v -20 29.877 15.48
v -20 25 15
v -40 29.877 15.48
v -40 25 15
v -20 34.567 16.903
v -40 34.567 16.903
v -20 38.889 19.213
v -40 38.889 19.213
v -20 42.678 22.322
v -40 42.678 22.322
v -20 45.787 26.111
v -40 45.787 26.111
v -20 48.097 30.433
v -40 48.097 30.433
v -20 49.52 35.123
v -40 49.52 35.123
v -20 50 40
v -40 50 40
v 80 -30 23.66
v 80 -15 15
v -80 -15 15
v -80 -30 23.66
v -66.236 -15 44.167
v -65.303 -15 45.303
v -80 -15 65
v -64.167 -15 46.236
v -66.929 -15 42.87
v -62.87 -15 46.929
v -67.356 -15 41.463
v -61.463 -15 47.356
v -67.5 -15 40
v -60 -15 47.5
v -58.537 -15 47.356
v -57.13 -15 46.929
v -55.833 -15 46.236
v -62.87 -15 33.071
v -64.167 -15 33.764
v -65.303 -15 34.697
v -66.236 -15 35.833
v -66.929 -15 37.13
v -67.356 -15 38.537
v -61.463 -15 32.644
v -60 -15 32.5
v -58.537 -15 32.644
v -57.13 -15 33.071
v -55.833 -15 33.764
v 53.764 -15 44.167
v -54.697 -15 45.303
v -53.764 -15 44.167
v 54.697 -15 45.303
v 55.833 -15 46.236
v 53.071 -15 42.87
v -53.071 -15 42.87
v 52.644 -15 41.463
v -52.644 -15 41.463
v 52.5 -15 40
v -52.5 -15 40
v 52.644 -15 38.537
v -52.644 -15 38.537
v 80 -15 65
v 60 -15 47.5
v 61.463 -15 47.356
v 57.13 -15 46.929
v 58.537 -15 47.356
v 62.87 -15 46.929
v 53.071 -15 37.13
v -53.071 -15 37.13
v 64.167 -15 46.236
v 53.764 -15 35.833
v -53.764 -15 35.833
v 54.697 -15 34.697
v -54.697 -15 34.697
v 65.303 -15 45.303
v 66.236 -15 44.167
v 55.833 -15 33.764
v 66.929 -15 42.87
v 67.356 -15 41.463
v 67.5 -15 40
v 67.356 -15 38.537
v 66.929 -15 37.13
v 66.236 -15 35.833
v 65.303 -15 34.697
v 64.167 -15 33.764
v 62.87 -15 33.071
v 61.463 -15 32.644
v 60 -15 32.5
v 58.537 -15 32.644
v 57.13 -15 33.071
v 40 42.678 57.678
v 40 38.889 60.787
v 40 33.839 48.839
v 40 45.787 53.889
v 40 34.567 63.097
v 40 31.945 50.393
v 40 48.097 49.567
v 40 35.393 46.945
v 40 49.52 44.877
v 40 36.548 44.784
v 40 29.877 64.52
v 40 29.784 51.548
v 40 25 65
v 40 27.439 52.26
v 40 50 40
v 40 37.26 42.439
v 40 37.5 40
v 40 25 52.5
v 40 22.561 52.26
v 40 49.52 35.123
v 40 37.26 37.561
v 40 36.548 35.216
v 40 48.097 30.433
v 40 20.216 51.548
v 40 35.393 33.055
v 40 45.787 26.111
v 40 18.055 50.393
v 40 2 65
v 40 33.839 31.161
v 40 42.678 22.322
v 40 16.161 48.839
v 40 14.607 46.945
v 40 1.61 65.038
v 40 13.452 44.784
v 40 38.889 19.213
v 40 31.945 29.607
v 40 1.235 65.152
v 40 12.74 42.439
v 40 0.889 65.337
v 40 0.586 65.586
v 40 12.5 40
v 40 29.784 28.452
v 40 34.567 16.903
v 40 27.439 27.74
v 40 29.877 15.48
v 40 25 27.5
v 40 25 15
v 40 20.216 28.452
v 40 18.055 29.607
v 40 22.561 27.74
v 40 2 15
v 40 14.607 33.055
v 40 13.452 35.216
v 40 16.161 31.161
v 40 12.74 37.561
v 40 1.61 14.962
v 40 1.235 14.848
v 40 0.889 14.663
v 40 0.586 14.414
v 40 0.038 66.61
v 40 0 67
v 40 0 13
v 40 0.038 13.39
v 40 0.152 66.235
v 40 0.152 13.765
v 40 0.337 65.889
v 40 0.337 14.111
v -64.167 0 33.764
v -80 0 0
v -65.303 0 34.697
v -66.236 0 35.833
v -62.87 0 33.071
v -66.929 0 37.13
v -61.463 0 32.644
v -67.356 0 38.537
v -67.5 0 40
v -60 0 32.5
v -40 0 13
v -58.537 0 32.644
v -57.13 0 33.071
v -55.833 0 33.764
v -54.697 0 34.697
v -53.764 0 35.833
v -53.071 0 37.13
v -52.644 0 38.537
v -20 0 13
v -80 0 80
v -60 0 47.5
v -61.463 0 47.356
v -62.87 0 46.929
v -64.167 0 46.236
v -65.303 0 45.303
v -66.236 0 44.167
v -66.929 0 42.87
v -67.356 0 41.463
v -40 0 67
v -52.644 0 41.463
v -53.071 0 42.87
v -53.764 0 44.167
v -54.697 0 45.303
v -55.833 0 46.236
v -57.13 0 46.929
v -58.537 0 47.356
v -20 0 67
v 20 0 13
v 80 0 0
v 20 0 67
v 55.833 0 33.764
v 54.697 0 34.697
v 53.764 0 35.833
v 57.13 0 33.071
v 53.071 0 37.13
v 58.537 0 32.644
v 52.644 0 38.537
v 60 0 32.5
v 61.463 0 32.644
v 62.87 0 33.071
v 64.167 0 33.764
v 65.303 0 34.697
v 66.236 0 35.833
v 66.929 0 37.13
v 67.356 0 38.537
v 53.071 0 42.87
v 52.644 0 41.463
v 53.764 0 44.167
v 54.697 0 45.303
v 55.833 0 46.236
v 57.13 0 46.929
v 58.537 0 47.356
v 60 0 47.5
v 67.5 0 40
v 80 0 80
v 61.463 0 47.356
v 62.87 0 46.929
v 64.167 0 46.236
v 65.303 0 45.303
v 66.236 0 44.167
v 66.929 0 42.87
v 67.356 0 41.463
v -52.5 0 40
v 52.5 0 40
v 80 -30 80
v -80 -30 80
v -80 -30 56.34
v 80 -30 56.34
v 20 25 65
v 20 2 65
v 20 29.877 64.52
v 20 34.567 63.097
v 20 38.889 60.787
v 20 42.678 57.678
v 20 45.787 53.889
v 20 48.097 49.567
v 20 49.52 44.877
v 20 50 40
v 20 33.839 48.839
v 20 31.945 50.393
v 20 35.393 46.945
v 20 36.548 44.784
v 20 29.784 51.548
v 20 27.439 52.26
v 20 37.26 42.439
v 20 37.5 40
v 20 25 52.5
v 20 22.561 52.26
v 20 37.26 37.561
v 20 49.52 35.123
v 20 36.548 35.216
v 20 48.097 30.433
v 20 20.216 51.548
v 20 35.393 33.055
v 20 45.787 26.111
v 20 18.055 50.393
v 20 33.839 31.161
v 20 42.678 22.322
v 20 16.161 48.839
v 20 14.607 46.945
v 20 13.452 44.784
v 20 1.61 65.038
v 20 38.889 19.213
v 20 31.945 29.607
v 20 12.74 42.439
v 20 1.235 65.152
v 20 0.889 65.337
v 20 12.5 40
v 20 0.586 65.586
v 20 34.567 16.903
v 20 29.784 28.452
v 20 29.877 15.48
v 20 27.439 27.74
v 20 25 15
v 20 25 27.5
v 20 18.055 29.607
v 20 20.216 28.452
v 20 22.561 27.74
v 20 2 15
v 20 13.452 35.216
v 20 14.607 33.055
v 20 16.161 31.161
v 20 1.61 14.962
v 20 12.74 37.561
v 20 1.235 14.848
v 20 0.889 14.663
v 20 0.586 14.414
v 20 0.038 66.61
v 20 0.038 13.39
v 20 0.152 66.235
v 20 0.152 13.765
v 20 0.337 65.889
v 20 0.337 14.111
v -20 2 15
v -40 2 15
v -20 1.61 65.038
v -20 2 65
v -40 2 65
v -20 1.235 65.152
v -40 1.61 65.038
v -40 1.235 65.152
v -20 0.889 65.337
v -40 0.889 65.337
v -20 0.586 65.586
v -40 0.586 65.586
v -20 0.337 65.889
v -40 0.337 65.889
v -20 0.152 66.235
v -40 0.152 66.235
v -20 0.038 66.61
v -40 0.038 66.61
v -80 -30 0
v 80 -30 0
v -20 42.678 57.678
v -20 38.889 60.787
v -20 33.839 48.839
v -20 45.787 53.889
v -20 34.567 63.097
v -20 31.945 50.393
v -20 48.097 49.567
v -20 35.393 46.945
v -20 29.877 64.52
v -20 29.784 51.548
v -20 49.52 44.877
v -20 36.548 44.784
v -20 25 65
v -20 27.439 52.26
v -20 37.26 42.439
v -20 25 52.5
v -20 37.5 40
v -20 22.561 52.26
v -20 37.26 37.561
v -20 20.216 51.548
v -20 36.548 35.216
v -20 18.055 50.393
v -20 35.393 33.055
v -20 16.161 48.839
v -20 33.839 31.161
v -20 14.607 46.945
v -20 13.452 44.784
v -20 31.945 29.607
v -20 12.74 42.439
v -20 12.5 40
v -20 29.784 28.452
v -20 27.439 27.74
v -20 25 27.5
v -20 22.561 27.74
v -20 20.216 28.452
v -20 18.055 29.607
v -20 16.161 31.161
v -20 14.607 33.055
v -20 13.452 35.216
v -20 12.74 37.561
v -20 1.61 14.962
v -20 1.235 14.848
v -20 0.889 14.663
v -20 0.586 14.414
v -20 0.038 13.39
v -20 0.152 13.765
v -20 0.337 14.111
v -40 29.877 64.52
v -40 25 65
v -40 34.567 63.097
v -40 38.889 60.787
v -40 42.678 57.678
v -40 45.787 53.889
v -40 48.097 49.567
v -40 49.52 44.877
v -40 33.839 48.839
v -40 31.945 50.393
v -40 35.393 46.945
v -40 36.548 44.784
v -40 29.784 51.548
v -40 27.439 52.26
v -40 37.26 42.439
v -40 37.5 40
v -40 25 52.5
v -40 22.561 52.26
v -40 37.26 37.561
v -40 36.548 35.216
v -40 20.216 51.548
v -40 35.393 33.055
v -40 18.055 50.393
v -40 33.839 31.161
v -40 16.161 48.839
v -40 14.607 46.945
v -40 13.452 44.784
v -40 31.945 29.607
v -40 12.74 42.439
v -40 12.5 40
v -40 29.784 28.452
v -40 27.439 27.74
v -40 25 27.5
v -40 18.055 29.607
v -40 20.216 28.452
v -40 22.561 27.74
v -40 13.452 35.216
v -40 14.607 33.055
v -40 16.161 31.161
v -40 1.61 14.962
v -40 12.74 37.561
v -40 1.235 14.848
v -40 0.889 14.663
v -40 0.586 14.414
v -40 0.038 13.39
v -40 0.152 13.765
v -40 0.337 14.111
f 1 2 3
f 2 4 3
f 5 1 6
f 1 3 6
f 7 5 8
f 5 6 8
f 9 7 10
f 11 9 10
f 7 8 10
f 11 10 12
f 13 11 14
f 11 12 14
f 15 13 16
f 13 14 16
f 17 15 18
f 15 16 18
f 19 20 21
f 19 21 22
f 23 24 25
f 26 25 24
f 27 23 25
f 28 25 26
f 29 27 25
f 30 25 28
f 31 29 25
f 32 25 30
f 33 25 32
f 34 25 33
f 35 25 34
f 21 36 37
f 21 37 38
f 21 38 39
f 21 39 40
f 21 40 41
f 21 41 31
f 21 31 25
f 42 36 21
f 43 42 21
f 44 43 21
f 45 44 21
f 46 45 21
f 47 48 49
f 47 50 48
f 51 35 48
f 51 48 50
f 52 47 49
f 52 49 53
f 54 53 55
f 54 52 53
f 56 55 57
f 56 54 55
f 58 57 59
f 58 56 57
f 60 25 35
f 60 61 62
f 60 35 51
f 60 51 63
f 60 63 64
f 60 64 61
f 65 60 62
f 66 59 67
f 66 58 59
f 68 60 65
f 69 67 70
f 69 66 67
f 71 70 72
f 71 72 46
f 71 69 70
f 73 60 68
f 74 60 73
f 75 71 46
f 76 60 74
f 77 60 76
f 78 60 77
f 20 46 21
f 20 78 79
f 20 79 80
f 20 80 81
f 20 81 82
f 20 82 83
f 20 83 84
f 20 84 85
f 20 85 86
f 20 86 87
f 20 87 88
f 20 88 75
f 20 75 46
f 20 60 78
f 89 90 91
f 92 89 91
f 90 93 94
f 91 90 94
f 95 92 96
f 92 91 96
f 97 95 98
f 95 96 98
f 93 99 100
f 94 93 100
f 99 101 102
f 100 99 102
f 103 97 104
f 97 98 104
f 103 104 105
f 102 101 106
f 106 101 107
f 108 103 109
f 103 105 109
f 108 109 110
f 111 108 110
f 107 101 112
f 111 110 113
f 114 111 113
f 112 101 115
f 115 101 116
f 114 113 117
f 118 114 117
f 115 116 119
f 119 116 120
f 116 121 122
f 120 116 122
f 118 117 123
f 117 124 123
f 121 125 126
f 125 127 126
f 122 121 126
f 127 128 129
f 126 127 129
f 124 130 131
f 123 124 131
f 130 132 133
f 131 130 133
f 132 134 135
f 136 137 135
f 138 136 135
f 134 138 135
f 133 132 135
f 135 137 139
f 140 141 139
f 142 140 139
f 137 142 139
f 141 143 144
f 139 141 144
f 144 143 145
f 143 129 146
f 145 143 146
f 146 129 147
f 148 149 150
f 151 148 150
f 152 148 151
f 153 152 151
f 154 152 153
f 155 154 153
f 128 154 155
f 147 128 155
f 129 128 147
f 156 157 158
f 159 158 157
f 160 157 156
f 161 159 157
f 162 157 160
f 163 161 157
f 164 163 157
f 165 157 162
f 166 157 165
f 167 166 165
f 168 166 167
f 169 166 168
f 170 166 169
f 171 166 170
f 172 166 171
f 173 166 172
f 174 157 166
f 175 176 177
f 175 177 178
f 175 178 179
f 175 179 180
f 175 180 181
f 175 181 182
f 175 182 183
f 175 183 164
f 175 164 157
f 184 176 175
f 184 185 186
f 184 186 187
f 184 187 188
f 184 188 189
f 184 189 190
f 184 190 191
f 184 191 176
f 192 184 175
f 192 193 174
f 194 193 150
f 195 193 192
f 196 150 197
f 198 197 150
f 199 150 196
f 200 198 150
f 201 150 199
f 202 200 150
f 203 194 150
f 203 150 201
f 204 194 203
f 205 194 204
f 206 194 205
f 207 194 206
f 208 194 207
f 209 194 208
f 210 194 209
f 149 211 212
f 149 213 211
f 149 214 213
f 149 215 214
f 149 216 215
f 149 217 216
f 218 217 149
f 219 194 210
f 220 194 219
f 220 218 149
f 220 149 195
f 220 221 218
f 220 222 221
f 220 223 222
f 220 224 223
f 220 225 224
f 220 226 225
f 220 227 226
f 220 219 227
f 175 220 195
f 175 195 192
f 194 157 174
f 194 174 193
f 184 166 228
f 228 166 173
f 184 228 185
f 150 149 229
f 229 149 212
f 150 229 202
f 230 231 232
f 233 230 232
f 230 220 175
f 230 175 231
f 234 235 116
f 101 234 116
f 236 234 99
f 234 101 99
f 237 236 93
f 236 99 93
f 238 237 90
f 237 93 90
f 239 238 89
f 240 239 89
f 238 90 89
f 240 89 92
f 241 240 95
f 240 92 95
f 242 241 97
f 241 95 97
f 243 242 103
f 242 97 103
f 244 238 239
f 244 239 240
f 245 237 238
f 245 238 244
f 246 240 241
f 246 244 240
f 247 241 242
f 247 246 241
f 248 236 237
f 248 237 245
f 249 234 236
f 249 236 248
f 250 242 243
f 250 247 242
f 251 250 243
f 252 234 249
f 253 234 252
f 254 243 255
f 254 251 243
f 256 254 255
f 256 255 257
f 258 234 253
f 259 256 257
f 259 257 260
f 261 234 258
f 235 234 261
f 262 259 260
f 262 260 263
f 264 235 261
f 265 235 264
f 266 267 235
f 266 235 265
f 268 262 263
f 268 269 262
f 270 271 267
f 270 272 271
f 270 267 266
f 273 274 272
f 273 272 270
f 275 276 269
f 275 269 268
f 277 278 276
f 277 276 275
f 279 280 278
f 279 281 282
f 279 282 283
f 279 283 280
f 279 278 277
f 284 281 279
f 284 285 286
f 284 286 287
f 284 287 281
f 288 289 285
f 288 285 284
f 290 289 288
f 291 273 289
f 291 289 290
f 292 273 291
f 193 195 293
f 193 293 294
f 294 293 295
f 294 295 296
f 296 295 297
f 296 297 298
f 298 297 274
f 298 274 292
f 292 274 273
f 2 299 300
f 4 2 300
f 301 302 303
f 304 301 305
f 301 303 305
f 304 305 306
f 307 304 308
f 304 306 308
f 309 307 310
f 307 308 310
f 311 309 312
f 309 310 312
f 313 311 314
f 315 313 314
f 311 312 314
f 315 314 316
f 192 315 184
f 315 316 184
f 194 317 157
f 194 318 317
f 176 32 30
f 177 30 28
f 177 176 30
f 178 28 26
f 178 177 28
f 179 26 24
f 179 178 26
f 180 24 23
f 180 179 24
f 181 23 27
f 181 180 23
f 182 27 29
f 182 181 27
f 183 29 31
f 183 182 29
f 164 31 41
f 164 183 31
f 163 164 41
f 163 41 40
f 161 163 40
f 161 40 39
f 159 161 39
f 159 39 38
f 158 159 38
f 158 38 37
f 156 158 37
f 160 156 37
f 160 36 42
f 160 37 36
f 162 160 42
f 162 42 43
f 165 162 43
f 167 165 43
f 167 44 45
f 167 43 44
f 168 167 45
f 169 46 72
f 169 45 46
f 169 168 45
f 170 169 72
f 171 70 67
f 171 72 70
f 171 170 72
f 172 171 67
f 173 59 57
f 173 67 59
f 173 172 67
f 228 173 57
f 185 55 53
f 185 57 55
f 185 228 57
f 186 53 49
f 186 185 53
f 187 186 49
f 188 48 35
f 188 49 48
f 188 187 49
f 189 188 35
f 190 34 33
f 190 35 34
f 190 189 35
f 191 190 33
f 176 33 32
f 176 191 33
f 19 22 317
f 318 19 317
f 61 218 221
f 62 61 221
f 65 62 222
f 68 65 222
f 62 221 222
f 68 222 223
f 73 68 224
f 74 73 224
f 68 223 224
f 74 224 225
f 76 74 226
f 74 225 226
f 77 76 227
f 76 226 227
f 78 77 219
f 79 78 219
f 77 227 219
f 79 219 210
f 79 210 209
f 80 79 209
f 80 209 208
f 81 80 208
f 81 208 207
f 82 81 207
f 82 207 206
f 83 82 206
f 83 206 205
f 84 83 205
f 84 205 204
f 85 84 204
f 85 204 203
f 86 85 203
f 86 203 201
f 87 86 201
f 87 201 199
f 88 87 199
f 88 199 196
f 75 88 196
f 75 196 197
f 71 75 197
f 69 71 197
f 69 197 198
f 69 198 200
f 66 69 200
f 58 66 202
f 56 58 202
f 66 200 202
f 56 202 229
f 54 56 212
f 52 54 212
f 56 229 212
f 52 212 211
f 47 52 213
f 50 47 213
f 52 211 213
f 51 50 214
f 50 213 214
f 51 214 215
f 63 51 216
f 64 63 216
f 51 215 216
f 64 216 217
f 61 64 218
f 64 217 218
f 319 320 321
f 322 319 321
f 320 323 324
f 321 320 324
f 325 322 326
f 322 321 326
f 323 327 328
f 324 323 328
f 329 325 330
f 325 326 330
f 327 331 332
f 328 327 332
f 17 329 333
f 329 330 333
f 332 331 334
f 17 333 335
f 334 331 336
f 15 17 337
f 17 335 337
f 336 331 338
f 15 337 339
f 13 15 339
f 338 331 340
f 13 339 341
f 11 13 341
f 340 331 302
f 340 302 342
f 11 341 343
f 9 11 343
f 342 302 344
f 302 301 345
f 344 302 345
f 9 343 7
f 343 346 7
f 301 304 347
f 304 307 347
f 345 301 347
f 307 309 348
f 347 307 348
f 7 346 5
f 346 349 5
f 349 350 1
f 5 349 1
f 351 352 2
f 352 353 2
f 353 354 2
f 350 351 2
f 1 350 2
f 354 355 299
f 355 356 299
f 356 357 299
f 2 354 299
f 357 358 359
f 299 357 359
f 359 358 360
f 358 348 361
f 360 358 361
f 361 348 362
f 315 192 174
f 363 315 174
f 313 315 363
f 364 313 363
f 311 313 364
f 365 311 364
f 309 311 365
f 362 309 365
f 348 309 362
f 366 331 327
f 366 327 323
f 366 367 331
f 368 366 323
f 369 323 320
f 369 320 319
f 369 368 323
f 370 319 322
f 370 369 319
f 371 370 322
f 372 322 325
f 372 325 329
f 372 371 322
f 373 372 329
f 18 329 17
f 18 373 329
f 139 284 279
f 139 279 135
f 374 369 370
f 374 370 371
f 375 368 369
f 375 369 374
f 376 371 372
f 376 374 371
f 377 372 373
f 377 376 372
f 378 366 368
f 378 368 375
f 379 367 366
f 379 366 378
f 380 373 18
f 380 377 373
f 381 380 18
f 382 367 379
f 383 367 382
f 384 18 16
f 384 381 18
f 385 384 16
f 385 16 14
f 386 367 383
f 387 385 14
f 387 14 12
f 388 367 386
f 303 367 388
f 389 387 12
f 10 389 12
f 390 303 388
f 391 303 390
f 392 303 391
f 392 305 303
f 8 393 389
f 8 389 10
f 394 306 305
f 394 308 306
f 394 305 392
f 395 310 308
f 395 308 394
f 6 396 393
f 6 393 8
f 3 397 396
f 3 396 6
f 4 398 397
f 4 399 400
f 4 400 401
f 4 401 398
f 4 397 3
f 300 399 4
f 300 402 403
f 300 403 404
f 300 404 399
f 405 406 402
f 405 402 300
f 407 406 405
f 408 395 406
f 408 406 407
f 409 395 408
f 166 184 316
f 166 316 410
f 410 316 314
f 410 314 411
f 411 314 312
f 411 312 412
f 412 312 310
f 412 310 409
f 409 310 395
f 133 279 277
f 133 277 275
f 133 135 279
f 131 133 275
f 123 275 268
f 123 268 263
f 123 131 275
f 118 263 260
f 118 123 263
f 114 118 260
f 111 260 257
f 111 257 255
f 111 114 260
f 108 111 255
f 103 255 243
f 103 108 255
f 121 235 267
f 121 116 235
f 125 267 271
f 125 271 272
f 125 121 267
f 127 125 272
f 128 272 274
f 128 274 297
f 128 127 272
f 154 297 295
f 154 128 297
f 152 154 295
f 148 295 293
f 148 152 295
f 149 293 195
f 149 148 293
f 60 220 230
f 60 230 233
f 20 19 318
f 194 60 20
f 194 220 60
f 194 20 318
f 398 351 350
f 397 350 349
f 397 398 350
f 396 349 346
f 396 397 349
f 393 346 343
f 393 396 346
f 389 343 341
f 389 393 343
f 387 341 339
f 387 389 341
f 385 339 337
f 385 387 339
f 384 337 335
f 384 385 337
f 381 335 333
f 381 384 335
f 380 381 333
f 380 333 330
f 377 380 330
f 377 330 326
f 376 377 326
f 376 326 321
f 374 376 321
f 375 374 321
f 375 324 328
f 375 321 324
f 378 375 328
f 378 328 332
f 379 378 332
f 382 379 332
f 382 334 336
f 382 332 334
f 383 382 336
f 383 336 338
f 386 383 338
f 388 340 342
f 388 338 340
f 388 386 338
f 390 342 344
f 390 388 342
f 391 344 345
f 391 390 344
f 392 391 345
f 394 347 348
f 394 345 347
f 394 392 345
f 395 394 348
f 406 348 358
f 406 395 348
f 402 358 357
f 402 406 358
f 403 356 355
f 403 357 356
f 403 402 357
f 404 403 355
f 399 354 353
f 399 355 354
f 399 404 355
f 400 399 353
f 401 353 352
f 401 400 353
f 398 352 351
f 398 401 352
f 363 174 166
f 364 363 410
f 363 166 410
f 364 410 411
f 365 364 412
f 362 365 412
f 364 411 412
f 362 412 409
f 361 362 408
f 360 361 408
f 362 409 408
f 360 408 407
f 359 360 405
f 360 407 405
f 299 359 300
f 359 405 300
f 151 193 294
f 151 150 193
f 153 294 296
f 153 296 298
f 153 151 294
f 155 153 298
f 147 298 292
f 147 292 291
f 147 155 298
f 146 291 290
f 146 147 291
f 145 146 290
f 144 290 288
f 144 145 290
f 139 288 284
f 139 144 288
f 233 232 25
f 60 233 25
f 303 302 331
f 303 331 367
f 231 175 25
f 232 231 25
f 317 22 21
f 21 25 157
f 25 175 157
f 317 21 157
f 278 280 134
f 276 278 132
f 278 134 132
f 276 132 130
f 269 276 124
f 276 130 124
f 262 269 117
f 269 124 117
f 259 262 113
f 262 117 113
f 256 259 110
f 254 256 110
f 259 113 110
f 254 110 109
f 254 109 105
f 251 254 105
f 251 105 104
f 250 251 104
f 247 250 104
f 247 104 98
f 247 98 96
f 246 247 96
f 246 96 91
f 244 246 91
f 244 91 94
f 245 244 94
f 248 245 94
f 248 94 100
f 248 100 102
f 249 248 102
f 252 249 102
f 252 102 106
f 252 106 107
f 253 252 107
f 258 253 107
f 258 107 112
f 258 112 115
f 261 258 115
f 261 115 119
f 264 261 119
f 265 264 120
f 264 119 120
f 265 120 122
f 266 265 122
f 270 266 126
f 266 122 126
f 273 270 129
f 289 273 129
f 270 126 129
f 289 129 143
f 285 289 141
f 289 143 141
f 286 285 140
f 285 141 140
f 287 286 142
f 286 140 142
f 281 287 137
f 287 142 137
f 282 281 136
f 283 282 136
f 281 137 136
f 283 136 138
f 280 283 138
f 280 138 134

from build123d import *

# Parameters (mm, degrees)
BOSS_EXTRUDE2_DEPTH   = 80
SKETCH3_W             = 20
SKETCH3_H             = 50
BOSS_EXTRUDE3_DEPTH   = 50
FILLET3_R             = 25
SKETCH8_R             = 12.5
CUT_EXTRUDE1_DEPTH    = 50
SKETCH9_R             = 7.5
CUT_EXTRUDE3_DEPTH    = 50
FILLET4_R             = 2
FILLET5_R             = 2
FILLET3_OF_MIRROR14_R = 25
FILLET4_OF_MIRROR14_R = 2
FILLET5_OF_MIRROR14_R = 2


with BuildPart() as part:
    # Sketch1 → Boss-Extrude2 (new body)
    with BuildSketch(Plane(origin=(0, 0, 0), x_dir=(0, 0, -1), z_dir=(1, 0, 0))):
        Polygon((0, 0), (-80, 0), (-80, -30), (-56.339745962, -30), (-65, -15), (-15, -15), (-23.660254038, -30), (0, -30), align=None)
    boss_extrude2 = extrude(amount=BOSS_EXTRUDE2_DEPTH)

    # Sketch3 → Boss-Extrude3 (add)
    with BuildSketch(Plane(origin=(0, 0, 0), x_dir=(1, 0, 0), z_dir=(0, 1, 0))):
        with Locations((30, -40)):
            Rectangle(SKETCH3_W, SKETCH3_H)
    boss_extrude3 = extrude(amount=BOSS_EXTRUDE3_DEPTH)

    # Fillet3
    fillet3_edges = [part.edges().sort_by_distance(p)[0] for p in [
        (30, 50, 65),
        (30, 50, 15),
    ]]
    fillet(fillet3_edges, radius=FILLET3_R - 0.0001)  # a hair under: the kernel refuses the full size

    # Sketch8 → Cut-Extrude1 (cut)
    with BuildSketch(Plane(origin=(40, 0, 0), x_dir=(0, 0, -1), z_dir=(1, 0, 0))):
        with Locations((-40, 25)):
            Circle(SKETCH8_R)
    cut_extrude1 = extrude(amount=-CUT_EXTRUDE1_DEPTH, mode=Mode.SUBTRACT)

    # Sketch9 → Cut-Extrude3 (cut)
    with BuildSketch(Plane(origin=(0, 0, 0), x_dir=(1, 0, 0), z_dir=(0, 1, 0))):
        with Locations(Location((60, -40, 0), (0, 0, 270))):
            Circle(SKETCH9_R)
    cut_extrude3 = extrude(amount=-CUT_EXTRUDE3_DEPTH, mode=Mode.SUBTRACT)

    # Fillet4
    fillet4_edges = [part.edges().sort_by_distance(p)[0] for p in [
        (30, 0, 65),
    ]]
    fillet(fillet4_edges, radius=FILLET4_R)

    # Fillet5
    fillet5_edges = [part.edges().sort_by_distance(p)[0] for p in [
        (30, 0, 15),
    ]]
    fillet(fillet5_edges, radius=FILLET5_R)

    # Mirror14: Boss-Extrude2, Boss-Extrude3, Cut-Extrude1, Cut-Extrude3 across plane
    add(boss_extrude2.mirror(Plane(origin=(0, 0, 0), x_dir=(0, 0, 1), z_dir=(1, 0, 0))))
    add(boss_extrude3.mirror(Plane(origin=(0, 0, 0), x_dir=(0, 0, 1), z_dir=(1, 0, 0))))
    add(cut_extrude1.mirror(Plane(origin=(0, 0, 0), x_dir=(0, 0, 1), z_dir=(1, 0, 0))), mode=Mode.SUBTRACT)
    add(cut_extrude3.mirror(Plane(origin=(0, 0, 0), x_dir=(0, 0, 1), z_dir=(1, 0, 0))), mode=Mode.SUBTRACT)

    # Fillet3 of Mirror14
    fillet3_of_mirror14_edges = [part.edges().sort_by_distance(p)[0] for p in [
        (-30, 50, 65),
        (-30, 50, 15),
    ]]
    fillet(fillet3_of_mirror14_edges, radius=FILLET3_OF_MIRROR14_R - 0.0001)  # a hair under: the kernel refuses the full size

    # Fillet4 of Mirror14
    fillet4_of_mirror14_edges = [part.edges().sort_by_distance(p)[0] for p in [
        (-30, 0, 65),
    ]]
    fillet(fillet4_of_mirror14_edges, radius=FILLET4_OF_MIRROR14_R)

    # Fillet5 of Mirror14
    fillet5_of_mirror14_edges = [part.edges().sort_by_distance(p)[0] for p in [
        (-30, 0, 15),
    ]]
    fillet(fillet5_of_mirror14_edges, radius=FILLET5_OF_MIRROR14_R)


solid = part.part
